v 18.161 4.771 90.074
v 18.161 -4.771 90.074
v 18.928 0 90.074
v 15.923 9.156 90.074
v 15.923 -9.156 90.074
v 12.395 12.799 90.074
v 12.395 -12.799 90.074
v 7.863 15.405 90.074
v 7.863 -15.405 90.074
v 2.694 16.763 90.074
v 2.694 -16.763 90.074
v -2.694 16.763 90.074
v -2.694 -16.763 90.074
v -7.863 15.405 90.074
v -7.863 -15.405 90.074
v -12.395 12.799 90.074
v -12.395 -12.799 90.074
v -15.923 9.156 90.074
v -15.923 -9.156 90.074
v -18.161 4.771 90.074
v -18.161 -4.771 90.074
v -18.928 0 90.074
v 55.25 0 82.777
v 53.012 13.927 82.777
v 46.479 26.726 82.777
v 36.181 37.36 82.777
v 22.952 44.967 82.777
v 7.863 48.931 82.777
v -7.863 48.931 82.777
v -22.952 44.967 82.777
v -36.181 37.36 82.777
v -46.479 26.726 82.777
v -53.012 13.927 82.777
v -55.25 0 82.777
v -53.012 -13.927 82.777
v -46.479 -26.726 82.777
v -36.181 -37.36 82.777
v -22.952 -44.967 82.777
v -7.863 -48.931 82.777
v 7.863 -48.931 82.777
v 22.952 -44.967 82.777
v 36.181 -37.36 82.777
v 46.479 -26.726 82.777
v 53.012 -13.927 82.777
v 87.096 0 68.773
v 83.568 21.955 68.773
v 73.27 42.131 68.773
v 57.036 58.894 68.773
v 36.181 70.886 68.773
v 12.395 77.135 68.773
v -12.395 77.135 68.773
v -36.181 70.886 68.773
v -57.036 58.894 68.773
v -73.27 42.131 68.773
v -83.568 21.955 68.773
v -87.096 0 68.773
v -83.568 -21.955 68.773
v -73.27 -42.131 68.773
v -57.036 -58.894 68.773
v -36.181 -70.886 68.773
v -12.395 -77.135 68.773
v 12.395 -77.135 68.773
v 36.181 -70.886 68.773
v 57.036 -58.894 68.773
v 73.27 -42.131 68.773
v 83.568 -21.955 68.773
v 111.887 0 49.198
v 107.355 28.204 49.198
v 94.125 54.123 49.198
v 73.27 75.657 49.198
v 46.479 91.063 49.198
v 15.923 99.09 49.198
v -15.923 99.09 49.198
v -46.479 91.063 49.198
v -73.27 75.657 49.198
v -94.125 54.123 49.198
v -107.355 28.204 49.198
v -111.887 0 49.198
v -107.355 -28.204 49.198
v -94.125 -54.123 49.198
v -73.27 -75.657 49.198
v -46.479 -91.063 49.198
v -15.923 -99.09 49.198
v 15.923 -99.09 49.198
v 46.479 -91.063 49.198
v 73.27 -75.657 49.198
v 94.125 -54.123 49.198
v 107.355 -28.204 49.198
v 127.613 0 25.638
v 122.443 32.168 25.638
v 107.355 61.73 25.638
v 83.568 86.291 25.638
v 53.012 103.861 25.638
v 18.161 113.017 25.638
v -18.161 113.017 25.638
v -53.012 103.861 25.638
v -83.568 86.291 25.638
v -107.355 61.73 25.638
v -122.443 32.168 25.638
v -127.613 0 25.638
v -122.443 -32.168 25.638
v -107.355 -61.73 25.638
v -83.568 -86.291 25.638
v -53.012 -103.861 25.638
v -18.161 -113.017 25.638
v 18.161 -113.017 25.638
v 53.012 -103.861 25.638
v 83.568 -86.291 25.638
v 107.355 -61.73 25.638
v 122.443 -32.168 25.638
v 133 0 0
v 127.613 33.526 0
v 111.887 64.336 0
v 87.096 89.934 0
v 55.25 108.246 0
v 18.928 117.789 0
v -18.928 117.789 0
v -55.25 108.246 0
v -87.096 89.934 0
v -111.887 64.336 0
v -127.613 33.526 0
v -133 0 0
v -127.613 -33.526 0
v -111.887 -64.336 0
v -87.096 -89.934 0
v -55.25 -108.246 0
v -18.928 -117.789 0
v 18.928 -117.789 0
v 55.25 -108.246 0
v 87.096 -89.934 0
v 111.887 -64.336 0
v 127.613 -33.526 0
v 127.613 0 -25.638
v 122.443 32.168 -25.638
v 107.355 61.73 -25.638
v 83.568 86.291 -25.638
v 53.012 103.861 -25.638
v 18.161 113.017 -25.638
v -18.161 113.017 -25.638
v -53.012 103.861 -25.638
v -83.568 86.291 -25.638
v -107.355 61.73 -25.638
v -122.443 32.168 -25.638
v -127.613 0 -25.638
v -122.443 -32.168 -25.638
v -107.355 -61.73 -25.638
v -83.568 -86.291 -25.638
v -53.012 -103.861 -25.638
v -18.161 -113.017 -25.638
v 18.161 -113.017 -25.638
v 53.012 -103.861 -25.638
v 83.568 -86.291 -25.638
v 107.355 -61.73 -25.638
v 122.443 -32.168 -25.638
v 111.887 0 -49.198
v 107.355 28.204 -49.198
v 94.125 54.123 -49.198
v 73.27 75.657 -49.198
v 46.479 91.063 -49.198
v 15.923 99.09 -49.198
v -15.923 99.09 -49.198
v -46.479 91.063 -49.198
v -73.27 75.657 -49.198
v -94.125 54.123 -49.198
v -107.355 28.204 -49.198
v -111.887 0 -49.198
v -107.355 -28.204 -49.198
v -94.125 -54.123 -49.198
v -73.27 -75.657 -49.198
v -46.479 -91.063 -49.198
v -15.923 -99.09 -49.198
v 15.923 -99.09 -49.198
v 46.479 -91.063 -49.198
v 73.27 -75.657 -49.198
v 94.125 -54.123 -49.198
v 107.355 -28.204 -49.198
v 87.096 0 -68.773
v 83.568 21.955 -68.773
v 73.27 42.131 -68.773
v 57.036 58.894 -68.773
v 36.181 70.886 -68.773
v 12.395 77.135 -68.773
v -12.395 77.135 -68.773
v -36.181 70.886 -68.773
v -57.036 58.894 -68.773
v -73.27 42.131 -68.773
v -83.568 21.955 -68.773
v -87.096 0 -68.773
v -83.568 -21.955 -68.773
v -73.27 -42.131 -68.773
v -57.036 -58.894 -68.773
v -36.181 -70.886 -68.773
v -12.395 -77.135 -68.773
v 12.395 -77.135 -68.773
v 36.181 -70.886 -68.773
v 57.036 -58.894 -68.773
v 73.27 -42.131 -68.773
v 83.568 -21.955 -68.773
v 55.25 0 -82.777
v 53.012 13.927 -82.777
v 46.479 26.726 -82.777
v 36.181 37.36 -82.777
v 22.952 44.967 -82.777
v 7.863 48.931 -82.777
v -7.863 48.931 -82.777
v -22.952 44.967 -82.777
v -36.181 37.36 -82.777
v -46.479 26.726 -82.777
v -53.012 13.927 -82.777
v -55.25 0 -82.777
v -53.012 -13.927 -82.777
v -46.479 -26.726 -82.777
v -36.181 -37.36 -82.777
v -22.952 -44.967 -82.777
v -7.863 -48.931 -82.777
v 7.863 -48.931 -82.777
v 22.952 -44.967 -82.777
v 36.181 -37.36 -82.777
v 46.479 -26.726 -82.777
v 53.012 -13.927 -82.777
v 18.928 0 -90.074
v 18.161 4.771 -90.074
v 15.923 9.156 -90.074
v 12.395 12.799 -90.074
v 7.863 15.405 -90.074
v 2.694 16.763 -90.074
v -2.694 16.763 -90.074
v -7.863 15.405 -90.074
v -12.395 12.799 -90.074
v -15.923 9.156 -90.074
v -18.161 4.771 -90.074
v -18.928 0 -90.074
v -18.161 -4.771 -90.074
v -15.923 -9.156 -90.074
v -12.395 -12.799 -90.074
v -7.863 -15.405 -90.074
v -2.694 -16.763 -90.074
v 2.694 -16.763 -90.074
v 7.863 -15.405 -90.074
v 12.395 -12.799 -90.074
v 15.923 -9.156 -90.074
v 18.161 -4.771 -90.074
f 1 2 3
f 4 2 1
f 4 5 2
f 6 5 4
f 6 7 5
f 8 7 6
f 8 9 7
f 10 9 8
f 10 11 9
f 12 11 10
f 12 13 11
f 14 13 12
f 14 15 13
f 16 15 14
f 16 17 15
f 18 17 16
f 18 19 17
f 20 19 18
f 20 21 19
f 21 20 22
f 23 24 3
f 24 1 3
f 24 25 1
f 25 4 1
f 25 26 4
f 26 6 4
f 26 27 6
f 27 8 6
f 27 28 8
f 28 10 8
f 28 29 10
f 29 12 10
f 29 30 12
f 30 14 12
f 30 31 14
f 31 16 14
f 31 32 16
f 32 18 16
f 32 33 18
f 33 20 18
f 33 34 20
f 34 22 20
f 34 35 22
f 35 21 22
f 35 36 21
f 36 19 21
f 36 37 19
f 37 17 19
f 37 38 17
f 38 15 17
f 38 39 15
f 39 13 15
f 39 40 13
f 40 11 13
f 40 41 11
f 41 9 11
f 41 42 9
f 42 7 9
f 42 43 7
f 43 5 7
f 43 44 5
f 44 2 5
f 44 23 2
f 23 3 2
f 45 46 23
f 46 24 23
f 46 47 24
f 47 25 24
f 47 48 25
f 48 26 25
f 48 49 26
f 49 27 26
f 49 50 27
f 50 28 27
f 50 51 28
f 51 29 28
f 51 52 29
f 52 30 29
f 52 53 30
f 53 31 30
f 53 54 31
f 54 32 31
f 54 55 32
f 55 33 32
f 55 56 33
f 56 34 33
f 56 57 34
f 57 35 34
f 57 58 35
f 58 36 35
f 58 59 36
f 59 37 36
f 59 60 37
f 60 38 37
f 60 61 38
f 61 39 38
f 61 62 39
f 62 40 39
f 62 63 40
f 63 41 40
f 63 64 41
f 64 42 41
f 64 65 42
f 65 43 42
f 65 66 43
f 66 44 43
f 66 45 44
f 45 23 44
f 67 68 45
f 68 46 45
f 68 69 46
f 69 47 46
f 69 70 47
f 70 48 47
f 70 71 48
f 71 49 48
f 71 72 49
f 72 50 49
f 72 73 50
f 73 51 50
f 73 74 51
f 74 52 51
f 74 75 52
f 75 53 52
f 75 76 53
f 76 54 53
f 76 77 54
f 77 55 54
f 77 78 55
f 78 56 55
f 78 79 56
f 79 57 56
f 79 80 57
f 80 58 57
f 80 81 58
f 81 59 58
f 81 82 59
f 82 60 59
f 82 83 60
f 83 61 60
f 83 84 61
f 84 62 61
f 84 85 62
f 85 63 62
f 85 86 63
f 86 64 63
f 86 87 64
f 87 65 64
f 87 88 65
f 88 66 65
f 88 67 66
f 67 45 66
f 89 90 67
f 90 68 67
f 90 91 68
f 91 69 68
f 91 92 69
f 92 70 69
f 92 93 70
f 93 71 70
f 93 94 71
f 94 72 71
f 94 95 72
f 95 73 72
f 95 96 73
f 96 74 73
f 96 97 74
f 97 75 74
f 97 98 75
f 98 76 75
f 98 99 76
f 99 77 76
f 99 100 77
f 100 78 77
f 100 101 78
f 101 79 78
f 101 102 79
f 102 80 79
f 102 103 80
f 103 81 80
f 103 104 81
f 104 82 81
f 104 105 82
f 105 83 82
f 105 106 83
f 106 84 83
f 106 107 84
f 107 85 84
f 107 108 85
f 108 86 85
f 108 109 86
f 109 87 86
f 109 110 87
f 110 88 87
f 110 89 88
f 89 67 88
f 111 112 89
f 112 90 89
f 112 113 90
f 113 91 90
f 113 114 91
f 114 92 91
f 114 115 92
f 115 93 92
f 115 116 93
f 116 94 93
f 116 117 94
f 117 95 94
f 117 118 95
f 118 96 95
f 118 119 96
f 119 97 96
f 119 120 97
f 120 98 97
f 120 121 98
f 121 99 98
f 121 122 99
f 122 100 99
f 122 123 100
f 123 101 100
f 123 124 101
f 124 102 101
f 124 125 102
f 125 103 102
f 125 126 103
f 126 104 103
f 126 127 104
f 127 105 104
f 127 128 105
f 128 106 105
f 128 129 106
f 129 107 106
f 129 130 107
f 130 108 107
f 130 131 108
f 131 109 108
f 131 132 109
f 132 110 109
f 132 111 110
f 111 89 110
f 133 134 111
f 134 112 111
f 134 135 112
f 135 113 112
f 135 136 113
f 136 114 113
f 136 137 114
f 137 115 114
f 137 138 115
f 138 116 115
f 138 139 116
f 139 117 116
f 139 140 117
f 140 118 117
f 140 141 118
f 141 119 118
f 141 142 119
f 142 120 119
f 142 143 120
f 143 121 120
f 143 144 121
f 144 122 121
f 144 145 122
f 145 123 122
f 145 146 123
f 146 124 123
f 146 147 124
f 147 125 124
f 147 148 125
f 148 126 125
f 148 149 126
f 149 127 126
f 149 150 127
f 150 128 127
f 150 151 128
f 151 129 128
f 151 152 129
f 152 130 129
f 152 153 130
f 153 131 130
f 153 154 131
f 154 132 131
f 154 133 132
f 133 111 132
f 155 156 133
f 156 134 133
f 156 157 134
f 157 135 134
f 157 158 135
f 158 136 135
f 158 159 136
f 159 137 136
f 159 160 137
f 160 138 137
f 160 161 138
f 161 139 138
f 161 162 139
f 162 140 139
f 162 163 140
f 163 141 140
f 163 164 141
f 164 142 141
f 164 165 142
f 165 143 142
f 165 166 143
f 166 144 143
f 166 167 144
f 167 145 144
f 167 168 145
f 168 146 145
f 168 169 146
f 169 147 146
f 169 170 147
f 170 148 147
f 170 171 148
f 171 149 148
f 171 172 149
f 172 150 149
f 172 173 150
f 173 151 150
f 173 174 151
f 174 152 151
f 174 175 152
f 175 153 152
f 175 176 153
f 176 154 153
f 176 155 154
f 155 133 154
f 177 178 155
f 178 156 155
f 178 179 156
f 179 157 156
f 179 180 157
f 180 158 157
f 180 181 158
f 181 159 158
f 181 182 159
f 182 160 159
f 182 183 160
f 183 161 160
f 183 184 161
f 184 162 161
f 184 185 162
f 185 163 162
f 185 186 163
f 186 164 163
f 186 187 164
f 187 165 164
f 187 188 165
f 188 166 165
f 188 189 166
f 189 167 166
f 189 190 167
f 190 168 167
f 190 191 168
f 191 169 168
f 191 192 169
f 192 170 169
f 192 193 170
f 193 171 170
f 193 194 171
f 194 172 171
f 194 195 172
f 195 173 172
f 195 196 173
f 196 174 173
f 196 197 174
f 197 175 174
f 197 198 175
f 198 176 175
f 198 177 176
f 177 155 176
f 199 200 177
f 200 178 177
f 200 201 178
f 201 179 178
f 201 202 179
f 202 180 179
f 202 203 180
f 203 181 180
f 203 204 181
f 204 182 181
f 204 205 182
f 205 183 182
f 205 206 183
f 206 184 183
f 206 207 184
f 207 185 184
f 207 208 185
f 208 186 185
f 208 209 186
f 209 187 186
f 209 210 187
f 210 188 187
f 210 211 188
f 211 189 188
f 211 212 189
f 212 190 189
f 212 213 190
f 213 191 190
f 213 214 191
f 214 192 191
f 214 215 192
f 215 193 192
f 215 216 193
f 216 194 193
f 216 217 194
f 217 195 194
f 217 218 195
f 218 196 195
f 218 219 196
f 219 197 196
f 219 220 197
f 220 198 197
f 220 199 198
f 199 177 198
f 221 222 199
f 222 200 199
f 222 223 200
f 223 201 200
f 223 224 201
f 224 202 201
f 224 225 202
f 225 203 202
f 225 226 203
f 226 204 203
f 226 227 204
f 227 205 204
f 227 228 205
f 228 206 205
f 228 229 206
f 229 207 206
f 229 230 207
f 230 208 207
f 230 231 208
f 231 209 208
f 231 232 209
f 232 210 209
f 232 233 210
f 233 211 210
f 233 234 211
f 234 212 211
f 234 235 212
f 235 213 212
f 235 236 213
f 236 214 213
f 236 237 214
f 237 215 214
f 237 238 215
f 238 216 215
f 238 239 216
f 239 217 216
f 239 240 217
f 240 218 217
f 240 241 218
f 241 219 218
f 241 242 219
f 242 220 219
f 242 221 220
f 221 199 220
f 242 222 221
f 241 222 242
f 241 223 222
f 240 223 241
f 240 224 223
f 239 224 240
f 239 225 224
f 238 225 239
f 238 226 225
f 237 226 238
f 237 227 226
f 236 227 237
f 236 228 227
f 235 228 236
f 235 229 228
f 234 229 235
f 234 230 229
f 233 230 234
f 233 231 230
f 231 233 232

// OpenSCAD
// Generated by SolidPython 1.0.1 on 2020-07-29 00:46:54


scale(v = [19, 17, 13]) {
	sphere(r = 7);
}
/***********************************************
*********      SolidPython code:      **********
************************************************
 
# import packages: SolidPython
from solid import *
from solid.utils import *
from itertools import chain, combinations, permutations


class Resize:

    def __init__(self, scad_file):
        self.scad_file = scad_file
        #self.scad_file = import_scad(scad_file)
        # cone/cylinder param:
        self.r1 = 0
        self.r2 = 0
        self.h = 0
        # rectangular prism param:
        self.w = 0
        self.l = 0
        # ellipse param:
        self.r = 0

    # import OpenScad code (file name corresponds to shape)


    # classify shape + parameters
    def assign(self, param1, param2, param3):
        if self.scad_file == 'cone.scad':
            self.r1 = param1
            self.r2 = param2
            self.h = param3
        elif self.scad_file == 'cylinder.scad':
            self.r1 = param1
            self.r2 = param2
            self.h = param3
        elif self.scad_file == 'rectangularPrism.scad':
            self.h = param1
            self.l = param2
            self.w = param3
        else:
            self.r = param1
            self.h = param2

    # resize parameters
    def iterate(self):
        x = range(3, 20, 2)
        i = 1
        if self.scad_file == 'cone.scad':
            tempList = list(permutations(x, 2))
            for temp in tempList:
                param1 = temp[0]
                param2 = temp[1]
                filepath = 'produced_scad_files/' + 'cone' + str(param1) + '_' + str(param2) + '_' + '.scad'
                scad_render_to_file(cylinder(h=param1, r1=param2, r2=0), filepath)

        elif self.scad_file == 'cylinder.scad':
            tempList = list(permutations(x, 3))
            for temp in tempList:
                param1 = temp[0]
                param2 = temp[1]
                filepath = 'produced_scad_files/' + 'cylinder' + str(param1) + '_' + str(param2) + '_' + '.scad'
                scad_render_to_file(cylinder(h=param1, r1=param2, r2=param2), filepath)

        elif self.scad_file == 'rectangularPrism.scad':
            tempList = list(permutations(x, 3))
            for temp in tempList:
                param1 = temp[0]
                param2 = temp[1]
                param3 = temp[2]
                filepath = 'produced_scad_files/' + 'rectangularPrism' + str(param1) + '_' + str(param2) + '_' + str(
                    param3) + '.scad'
                scad_render_to_file(cube(size=(param1, param2, param3)), filepath)

        elif self.scad_file == 'ellipse.scad':
            tempList = list(permutations(x, 4))
            for temp in tempList:
                param1 = temp[0]
                param2 = temp[1]
                param3 = temp[2]
                param4 = temp[3]
                filepath = 'produced_scad_files/' + 'ellipse' + str(param1) + '_' + str(param2) + '_' + str(param3) + '_' + str(param4) + '.scad'
                scad_render_to_file(scale([param1, param2, param3])(sphere(r=param4)), filepath)

    def render_to_scadfile(self):
        scad_render_to_file(scad, 'example.scad') 
 
************************************************/
